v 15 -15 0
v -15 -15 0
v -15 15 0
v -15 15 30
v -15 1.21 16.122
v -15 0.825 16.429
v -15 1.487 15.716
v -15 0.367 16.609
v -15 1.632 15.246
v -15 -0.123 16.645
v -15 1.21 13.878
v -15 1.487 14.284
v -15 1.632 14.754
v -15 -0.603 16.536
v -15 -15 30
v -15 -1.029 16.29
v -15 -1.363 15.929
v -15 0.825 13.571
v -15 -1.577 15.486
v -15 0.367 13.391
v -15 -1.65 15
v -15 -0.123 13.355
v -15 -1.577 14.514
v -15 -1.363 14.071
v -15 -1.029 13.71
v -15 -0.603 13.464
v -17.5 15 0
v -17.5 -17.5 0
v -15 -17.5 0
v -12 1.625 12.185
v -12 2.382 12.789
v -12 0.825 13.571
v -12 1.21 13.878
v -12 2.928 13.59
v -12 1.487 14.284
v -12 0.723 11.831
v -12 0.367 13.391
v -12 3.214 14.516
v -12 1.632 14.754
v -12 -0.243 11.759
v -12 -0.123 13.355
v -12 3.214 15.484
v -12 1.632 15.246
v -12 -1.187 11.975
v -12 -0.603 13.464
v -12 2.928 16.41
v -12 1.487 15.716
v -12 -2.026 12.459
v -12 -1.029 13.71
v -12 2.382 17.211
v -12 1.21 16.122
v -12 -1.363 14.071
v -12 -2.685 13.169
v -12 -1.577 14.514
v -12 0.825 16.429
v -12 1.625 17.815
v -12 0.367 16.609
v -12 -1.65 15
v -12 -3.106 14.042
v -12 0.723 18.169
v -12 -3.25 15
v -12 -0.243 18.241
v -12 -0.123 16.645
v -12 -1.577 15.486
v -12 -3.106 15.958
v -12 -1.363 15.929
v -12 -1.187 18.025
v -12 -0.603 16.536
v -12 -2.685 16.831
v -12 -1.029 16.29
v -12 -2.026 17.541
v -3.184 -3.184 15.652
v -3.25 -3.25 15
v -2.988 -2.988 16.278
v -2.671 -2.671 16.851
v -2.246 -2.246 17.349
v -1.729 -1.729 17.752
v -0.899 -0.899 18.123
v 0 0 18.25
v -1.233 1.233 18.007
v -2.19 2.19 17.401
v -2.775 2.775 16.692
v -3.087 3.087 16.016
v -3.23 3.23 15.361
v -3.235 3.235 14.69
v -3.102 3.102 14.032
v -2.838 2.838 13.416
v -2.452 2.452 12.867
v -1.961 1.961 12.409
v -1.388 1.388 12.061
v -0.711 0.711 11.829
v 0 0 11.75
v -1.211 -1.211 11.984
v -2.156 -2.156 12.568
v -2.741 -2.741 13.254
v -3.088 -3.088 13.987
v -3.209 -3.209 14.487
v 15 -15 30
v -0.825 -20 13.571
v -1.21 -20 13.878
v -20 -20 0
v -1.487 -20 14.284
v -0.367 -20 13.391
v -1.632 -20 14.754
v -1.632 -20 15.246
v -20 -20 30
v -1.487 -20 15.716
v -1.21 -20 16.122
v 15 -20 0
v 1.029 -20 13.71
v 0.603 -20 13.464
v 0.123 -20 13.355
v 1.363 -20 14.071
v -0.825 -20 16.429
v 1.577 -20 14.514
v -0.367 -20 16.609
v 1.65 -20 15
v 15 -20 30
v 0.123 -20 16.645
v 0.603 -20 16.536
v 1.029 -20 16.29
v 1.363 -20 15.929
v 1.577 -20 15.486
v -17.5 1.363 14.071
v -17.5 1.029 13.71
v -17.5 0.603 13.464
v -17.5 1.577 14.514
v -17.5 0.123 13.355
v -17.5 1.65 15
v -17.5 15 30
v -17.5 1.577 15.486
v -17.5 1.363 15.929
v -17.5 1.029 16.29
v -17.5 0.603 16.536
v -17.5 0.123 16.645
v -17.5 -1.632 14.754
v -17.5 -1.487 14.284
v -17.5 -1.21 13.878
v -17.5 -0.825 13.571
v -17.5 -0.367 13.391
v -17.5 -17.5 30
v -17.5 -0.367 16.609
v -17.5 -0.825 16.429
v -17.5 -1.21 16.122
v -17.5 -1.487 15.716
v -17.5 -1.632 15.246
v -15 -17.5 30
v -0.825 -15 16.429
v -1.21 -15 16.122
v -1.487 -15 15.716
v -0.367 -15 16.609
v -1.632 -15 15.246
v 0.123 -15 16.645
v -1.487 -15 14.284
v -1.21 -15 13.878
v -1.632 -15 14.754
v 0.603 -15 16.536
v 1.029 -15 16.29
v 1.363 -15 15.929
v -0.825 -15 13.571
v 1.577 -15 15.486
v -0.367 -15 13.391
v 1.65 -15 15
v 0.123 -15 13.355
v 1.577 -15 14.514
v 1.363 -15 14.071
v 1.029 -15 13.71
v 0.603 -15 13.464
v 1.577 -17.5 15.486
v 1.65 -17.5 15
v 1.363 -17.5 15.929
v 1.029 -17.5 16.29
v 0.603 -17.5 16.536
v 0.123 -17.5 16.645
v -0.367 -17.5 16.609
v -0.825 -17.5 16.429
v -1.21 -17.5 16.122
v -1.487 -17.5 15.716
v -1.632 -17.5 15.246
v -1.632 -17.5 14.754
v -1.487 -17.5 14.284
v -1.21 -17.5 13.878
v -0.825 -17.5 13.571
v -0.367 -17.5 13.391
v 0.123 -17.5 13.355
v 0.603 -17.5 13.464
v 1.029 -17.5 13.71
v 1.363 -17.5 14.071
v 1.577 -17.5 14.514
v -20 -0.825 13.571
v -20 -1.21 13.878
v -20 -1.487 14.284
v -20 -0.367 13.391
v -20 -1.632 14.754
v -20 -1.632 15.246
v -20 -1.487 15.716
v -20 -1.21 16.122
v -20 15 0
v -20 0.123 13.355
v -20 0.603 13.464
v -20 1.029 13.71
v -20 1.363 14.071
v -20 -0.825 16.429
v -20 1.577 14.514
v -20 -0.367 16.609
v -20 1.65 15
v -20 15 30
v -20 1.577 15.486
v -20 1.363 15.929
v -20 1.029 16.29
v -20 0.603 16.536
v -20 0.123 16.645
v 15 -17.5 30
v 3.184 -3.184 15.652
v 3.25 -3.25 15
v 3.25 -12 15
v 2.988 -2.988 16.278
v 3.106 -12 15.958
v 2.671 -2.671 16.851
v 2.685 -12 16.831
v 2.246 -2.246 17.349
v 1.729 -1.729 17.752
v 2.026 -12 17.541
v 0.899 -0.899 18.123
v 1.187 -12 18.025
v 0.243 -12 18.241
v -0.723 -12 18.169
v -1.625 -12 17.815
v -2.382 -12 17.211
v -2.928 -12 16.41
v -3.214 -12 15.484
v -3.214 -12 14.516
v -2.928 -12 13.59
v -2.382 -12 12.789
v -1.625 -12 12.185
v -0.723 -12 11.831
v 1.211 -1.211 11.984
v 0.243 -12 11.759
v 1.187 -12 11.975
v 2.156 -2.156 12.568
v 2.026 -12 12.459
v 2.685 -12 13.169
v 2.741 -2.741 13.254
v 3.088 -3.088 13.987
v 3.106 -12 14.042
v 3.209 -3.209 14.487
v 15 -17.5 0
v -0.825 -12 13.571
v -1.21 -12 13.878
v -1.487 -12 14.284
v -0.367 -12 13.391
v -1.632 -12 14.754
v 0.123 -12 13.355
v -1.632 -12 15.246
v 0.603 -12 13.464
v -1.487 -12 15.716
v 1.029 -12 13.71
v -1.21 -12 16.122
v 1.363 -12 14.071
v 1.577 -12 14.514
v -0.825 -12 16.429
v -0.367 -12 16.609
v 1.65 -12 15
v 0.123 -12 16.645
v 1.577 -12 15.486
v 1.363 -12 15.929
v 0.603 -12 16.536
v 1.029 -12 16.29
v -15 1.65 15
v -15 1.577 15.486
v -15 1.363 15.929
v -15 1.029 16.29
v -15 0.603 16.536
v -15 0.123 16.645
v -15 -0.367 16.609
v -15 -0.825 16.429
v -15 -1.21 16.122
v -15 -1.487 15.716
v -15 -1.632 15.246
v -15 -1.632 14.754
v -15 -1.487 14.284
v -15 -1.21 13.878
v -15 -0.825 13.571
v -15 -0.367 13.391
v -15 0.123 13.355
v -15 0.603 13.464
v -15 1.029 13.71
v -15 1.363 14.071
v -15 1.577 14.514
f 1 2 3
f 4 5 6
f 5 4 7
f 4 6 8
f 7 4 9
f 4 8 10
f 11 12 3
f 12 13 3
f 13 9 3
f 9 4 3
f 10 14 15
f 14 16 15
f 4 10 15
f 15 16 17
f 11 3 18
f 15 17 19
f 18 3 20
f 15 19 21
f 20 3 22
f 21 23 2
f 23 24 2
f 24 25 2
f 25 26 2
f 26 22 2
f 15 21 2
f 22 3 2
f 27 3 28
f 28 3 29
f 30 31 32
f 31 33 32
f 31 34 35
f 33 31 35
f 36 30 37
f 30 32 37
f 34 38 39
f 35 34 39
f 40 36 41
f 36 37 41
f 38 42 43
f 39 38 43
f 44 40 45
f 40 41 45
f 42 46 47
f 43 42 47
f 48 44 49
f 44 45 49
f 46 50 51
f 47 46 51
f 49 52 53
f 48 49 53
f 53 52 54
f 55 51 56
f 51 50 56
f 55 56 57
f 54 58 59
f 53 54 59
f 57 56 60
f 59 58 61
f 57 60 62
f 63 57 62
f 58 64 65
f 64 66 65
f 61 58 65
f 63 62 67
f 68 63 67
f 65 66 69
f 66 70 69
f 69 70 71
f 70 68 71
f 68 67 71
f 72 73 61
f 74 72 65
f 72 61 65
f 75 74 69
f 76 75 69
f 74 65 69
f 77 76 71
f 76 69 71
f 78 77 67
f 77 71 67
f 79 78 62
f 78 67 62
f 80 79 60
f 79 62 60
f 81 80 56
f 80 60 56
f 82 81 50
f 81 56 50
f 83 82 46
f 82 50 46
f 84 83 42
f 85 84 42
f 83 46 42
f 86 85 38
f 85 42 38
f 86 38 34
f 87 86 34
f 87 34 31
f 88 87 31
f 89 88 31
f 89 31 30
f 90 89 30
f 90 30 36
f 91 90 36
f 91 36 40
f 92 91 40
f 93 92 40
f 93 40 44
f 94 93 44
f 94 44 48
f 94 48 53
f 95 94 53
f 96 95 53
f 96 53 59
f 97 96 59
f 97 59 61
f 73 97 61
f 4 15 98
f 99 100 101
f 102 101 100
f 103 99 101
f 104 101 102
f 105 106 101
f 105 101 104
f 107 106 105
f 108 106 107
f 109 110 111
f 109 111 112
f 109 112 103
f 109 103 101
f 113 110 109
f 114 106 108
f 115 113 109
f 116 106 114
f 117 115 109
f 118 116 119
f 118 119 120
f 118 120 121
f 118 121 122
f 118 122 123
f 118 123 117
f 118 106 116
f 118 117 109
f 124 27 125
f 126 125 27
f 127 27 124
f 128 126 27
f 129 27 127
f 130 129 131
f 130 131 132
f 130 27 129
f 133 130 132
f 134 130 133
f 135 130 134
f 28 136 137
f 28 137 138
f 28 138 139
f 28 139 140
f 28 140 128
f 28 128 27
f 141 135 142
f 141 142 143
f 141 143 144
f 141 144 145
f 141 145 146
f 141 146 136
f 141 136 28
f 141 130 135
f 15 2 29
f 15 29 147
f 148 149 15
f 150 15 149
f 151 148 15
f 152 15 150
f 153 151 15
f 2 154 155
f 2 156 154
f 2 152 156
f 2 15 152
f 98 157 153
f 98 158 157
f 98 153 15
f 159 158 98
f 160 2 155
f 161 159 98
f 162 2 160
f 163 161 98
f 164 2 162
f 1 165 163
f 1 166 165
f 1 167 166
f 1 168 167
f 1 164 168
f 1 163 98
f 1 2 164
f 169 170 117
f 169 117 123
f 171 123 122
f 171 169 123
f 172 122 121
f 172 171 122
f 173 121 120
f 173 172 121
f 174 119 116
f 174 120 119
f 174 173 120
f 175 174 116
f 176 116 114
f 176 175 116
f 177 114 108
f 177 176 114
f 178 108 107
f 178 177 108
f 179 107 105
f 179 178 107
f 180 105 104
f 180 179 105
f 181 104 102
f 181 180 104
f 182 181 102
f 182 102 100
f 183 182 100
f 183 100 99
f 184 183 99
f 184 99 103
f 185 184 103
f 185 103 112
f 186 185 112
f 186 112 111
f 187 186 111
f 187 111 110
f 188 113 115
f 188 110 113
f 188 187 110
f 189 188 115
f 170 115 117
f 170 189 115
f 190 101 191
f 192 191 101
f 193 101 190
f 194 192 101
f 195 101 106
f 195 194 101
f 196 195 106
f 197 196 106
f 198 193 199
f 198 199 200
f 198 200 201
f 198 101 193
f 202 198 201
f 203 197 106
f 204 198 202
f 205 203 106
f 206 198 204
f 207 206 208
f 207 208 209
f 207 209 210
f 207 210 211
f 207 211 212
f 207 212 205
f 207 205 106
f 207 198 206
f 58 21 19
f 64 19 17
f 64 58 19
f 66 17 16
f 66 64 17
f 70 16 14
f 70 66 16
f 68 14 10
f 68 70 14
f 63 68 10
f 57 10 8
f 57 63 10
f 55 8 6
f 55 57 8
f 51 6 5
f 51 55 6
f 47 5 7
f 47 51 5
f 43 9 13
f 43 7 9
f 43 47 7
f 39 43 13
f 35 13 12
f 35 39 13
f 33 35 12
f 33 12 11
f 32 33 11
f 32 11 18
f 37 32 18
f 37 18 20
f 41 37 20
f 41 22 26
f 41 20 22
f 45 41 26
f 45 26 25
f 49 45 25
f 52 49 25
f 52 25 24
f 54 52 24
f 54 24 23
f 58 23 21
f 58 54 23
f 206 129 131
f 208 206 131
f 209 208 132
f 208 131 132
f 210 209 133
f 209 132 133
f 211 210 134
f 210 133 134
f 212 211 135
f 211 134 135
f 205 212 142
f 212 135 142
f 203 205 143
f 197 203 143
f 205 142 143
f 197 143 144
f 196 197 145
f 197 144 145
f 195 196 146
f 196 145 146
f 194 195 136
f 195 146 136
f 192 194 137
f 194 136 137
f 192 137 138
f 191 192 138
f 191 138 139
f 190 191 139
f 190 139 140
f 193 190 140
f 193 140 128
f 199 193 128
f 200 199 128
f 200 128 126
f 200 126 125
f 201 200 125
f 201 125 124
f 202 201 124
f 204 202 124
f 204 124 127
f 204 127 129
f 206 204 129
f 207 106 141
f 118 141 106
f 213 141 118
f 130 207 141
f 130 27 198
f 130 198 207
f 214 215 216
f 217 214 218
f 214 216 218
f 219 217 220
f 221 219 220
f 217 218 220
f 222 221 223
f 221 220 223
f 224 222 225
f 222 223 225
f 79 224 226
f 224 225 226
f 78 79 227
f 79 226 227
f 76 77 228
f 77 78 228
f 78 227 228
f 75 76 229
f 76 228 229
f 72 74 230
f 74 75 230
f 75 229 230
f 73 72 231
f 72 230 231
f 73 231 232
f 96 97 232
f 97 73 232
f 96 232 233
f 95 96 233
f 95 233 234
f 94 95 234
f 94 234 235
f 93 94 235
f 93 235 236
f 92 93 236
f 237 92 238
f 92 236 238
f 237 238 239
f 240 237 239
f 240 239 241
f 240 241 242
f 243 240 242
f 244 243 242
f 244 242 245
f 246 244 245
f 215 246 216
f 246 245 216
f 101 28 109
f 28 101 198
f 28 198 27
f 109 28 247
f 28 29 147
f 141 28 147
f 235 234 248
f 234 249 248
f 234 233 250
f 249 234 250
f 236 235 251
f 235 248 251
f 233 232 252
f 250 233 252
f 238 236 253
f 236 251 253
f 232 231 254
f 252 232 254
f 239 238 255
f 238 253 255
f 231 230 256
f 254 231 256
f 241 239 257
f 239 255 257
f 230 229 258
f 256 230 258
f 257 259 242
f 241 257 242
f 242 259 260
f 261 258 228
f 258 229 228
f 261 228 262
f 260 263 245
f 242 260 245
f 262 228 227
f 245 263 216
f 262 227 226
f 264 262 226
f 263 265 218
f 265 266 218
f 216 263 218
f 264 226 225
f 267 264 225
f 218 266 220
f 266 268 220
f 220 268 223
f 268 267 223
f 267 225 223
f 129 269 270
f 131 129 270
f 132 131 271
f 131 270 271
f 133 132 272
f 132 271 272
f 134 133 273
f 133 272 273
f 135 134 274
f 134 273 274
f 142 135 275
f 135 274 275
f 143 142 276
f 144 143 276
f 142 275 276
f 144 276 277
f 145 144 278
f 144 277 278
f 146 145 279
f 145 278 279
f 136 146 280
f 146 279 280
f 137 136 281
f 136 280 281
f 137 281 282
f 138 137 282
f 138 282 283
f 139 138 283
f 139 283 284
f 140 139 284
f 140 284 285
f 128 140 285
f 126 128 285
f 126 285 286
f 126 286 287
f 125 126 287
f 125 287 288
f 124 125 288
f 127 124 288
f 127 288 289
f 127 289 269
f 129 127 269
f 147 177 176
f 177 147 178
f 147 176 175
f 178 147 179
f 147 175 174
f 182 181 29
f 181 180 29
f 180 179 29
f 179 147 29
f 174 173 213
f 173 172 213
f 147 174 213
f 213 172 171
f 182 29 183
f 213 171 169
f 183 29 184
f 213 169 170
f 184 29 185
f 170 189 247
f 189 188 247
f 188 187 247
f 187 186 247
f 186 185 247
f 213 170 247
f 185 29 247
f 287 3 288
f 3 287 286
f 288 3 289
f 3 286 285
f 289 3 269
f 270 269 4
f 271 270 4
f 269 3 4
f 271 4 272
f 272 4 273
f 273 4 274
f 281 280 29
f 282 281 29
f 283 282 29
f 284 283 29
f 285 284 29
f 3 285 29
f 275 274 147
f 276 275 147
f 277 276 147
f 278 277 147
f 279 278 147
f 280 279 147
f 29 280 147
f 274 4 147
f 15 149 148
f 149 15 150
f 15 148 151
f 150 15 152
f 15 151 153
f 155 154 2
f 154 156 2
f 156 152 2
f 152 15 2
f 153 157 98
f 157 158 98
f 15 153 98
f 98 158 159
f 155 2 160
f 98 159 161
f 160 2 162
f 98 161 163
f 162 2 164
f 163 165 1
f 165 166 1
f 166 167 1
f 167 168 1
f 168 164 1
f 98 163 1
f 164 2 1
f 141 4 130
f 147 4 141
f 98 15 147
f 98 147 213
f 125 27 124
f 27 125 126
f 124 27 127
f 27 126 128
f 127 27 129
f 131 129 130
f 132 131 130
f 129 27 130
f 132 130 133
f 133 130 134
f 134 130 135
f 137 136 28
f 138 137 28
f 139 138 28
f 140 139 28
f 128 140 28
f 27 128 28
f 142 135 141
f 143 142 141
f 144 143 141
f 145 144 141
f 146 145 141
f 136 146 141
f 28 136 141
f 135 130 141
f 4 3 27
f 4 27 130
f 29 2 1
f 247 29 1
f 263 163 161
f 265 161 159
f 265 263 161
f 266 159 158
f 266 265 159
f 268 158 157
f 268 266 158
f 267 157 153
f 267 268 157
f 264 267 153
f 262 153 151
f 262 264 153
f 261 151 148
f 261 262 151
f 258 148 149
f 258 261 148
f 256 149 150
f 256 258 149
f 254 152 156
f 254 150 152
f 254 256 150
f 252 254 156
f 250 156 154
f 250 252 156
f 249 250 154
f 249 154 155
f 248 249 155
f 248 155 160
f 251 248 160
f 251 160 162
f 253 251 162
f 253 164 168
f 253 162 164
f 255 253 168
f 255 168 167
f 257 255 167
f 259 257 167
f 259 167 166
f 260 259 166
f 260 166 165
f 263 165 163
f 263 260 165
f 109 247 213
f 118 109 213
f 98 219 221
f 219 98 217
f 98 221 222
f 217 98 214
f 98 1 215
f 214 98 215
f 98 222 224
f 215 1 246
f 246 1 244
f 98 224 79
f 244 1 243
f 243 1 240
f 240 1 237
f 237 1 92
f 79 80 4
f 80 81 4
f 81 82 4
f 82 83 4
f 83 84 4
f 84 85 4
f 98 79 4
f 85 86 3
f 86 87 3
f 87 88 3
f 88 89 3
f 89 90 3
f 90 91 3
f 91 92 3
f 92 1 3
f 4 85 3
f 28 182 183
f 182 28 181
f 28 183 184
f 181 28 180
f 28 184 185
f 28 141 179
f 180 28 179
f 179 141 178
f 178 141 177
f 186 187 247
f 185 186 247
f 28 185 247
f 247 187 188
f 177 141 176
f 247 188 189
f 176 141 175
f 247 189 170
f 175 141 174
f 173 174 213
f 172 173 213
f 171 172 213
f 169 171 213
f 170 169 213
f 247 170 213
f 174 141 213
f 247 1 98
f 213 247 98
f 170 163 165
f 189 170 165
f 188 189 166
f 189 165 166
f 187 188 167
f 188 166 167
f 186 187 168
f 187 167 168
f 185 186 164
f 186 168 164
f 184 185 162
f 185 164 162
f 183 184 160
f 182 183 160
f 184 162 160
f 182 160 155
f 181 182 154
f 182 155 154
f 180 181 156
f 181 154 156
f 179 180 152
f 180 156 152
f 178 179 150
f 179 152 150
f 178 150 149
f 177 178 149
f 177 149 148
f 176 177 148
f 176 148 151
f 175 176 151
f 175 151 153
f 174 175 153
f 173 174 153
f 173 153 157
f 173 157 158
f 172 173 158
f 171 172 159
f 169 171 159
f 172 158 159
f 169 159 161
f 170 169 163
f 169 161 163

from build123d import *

# Parameters (mm, degrees)
F2_DEPTH  = 30
F4_R      = 3.25
F5_DEPTH  = 27.001
F6_R      = 1.65
F7_DEPTH  = 3.001
F9_R      = 3.25
F10_DEPTH = 27.001
F11_R     = 1.65
F12_DEPTH = 25
F13_DEPTH = 2.5
F14_W     = 32.5
F14_H     = 30
F15_DEPTH = 2.5
F16_DEPTH = 2.5
F17_W     = 35
F17_H     = 30
F18_DEPTH = 2.5
F19_R     = 1.65
F20_DEPTH = 25
F21_R     = 1.65
F22_DEPTH = 25


with BuildPart() as f2:
    # F1 (on Top) → F2 (new body)
    with BuildSketch(Plane.XY):
        Polygon((-15, -15), (15, -15), (-15, 15), align=None)
    extrude(amount=F2_DEPTH)

    # F4 (on offset) → F5 (cut, through all)
    with BuildSketch(Plane(origin=(-12, 0, 0), x_dir=(0, -1, 0), z_dir=(-1, 0, 0))):
        with Locations((0, 15)):
            Circle(F4_R)
    extrude(amount=-F5_DEPTH, mode=Mode.SUBTRACT)

    # F6 (on offset) → F7 (cut, through all)
    with BuildSketch(Plane(origin=(-12, 0, 0), x_dir=(0, -1, 0), z_dir=(-1, 0, 0))):
        with Locations((0, 15)):
            Circle(F6_R)
    extrude(amount=F7_DEPTH, mode=Mode.SUBTRACT)

    # F9 (on offset) → F10 (cut, through all)
    with BuildSketch(Plane.XZ.offset(12)):
        with Locations((0, 15)):
            Circle(F9_R)
    extrude(amount=-F10_DEPTH, mode=Mode.SUBTRACT)

    # F11 (on offset) → F12 (cut)
    with BuildSketch(Plane.XZ.offset(12)):
        with Locations((0, 15)):
            Circle(F11_R)
    extrude(amount=F12_DEPTH, mode=Mode.SUBTRACT)


with BuildPart() as f13:
    # F13 (new): a face of the model
    f13_faces = [f2.part.faces().sort_by_distance(p)[0] for p in [
        (-14.5757359313, -15, 15),
    ]]
    extrude(f13_faces, amount=F13_DEPTH)


with BuildPart() as f15:
    # F14 (on face) → F15 (new body)
    with BuildSketch(Plane(origin=(-15, 0, 0), x_dir=(0, -1, 0), z_dir=(-1, 0, 0))):
        with Locations((1.25, 15)):
            Rectangle(F14_W, F14_H)
    extrude(amount=F15_DEPTH)


with BuildPart() as f16:
    # F16 (new): a face of the model
    f16_faces = [f15.part.faces().sort_by_distance(p)[0] for p in [
        (-17.5, -1.25, 15),
    ]]
    extrude(f16_faces, amount=F16_DEPTH)

    # F17 (on face) → F18 (join)
    with BuildSketch(Plane.XZ.offset(17.5)):
        with Locations((-2.5, 15)):
            Rectangle(F17_W, F17_H)
    extrude(amount=F18_DEPTH)

    # F19 (on face) → F20 (cut)
    with BuildSketch(Plane.XZ.offset(12)):
        with Locations((0, 15)):
            Circle(F19_R)
    extrude(amount=F20_DEPTH, mode=Mode.SUBTRACT)


with BuildPart() as f22_tool:
    # F21 (on face) → F22 (new body)
    with BuildSketch(Plane.YZ.offset(-15)):
        with Locations((0, 15)):
            Circle(F21_R)
    extrude(amount=-F22_DEPTH)


with BuildPart() as f15_1:
    add(f15.part)

    # F22: cut by f22_tool
    add(f22_tool.part, mode=Mode.SUBTRACT)


with BuildPart() as f16_1:
    add(f16.part)

    # F22: cut by f22_tool
    add(f22_tool.part, mode=Mode.SUBTRACT)


solid = Compound([f2.part, f13.part, f15_1.part, f16_1.part])
